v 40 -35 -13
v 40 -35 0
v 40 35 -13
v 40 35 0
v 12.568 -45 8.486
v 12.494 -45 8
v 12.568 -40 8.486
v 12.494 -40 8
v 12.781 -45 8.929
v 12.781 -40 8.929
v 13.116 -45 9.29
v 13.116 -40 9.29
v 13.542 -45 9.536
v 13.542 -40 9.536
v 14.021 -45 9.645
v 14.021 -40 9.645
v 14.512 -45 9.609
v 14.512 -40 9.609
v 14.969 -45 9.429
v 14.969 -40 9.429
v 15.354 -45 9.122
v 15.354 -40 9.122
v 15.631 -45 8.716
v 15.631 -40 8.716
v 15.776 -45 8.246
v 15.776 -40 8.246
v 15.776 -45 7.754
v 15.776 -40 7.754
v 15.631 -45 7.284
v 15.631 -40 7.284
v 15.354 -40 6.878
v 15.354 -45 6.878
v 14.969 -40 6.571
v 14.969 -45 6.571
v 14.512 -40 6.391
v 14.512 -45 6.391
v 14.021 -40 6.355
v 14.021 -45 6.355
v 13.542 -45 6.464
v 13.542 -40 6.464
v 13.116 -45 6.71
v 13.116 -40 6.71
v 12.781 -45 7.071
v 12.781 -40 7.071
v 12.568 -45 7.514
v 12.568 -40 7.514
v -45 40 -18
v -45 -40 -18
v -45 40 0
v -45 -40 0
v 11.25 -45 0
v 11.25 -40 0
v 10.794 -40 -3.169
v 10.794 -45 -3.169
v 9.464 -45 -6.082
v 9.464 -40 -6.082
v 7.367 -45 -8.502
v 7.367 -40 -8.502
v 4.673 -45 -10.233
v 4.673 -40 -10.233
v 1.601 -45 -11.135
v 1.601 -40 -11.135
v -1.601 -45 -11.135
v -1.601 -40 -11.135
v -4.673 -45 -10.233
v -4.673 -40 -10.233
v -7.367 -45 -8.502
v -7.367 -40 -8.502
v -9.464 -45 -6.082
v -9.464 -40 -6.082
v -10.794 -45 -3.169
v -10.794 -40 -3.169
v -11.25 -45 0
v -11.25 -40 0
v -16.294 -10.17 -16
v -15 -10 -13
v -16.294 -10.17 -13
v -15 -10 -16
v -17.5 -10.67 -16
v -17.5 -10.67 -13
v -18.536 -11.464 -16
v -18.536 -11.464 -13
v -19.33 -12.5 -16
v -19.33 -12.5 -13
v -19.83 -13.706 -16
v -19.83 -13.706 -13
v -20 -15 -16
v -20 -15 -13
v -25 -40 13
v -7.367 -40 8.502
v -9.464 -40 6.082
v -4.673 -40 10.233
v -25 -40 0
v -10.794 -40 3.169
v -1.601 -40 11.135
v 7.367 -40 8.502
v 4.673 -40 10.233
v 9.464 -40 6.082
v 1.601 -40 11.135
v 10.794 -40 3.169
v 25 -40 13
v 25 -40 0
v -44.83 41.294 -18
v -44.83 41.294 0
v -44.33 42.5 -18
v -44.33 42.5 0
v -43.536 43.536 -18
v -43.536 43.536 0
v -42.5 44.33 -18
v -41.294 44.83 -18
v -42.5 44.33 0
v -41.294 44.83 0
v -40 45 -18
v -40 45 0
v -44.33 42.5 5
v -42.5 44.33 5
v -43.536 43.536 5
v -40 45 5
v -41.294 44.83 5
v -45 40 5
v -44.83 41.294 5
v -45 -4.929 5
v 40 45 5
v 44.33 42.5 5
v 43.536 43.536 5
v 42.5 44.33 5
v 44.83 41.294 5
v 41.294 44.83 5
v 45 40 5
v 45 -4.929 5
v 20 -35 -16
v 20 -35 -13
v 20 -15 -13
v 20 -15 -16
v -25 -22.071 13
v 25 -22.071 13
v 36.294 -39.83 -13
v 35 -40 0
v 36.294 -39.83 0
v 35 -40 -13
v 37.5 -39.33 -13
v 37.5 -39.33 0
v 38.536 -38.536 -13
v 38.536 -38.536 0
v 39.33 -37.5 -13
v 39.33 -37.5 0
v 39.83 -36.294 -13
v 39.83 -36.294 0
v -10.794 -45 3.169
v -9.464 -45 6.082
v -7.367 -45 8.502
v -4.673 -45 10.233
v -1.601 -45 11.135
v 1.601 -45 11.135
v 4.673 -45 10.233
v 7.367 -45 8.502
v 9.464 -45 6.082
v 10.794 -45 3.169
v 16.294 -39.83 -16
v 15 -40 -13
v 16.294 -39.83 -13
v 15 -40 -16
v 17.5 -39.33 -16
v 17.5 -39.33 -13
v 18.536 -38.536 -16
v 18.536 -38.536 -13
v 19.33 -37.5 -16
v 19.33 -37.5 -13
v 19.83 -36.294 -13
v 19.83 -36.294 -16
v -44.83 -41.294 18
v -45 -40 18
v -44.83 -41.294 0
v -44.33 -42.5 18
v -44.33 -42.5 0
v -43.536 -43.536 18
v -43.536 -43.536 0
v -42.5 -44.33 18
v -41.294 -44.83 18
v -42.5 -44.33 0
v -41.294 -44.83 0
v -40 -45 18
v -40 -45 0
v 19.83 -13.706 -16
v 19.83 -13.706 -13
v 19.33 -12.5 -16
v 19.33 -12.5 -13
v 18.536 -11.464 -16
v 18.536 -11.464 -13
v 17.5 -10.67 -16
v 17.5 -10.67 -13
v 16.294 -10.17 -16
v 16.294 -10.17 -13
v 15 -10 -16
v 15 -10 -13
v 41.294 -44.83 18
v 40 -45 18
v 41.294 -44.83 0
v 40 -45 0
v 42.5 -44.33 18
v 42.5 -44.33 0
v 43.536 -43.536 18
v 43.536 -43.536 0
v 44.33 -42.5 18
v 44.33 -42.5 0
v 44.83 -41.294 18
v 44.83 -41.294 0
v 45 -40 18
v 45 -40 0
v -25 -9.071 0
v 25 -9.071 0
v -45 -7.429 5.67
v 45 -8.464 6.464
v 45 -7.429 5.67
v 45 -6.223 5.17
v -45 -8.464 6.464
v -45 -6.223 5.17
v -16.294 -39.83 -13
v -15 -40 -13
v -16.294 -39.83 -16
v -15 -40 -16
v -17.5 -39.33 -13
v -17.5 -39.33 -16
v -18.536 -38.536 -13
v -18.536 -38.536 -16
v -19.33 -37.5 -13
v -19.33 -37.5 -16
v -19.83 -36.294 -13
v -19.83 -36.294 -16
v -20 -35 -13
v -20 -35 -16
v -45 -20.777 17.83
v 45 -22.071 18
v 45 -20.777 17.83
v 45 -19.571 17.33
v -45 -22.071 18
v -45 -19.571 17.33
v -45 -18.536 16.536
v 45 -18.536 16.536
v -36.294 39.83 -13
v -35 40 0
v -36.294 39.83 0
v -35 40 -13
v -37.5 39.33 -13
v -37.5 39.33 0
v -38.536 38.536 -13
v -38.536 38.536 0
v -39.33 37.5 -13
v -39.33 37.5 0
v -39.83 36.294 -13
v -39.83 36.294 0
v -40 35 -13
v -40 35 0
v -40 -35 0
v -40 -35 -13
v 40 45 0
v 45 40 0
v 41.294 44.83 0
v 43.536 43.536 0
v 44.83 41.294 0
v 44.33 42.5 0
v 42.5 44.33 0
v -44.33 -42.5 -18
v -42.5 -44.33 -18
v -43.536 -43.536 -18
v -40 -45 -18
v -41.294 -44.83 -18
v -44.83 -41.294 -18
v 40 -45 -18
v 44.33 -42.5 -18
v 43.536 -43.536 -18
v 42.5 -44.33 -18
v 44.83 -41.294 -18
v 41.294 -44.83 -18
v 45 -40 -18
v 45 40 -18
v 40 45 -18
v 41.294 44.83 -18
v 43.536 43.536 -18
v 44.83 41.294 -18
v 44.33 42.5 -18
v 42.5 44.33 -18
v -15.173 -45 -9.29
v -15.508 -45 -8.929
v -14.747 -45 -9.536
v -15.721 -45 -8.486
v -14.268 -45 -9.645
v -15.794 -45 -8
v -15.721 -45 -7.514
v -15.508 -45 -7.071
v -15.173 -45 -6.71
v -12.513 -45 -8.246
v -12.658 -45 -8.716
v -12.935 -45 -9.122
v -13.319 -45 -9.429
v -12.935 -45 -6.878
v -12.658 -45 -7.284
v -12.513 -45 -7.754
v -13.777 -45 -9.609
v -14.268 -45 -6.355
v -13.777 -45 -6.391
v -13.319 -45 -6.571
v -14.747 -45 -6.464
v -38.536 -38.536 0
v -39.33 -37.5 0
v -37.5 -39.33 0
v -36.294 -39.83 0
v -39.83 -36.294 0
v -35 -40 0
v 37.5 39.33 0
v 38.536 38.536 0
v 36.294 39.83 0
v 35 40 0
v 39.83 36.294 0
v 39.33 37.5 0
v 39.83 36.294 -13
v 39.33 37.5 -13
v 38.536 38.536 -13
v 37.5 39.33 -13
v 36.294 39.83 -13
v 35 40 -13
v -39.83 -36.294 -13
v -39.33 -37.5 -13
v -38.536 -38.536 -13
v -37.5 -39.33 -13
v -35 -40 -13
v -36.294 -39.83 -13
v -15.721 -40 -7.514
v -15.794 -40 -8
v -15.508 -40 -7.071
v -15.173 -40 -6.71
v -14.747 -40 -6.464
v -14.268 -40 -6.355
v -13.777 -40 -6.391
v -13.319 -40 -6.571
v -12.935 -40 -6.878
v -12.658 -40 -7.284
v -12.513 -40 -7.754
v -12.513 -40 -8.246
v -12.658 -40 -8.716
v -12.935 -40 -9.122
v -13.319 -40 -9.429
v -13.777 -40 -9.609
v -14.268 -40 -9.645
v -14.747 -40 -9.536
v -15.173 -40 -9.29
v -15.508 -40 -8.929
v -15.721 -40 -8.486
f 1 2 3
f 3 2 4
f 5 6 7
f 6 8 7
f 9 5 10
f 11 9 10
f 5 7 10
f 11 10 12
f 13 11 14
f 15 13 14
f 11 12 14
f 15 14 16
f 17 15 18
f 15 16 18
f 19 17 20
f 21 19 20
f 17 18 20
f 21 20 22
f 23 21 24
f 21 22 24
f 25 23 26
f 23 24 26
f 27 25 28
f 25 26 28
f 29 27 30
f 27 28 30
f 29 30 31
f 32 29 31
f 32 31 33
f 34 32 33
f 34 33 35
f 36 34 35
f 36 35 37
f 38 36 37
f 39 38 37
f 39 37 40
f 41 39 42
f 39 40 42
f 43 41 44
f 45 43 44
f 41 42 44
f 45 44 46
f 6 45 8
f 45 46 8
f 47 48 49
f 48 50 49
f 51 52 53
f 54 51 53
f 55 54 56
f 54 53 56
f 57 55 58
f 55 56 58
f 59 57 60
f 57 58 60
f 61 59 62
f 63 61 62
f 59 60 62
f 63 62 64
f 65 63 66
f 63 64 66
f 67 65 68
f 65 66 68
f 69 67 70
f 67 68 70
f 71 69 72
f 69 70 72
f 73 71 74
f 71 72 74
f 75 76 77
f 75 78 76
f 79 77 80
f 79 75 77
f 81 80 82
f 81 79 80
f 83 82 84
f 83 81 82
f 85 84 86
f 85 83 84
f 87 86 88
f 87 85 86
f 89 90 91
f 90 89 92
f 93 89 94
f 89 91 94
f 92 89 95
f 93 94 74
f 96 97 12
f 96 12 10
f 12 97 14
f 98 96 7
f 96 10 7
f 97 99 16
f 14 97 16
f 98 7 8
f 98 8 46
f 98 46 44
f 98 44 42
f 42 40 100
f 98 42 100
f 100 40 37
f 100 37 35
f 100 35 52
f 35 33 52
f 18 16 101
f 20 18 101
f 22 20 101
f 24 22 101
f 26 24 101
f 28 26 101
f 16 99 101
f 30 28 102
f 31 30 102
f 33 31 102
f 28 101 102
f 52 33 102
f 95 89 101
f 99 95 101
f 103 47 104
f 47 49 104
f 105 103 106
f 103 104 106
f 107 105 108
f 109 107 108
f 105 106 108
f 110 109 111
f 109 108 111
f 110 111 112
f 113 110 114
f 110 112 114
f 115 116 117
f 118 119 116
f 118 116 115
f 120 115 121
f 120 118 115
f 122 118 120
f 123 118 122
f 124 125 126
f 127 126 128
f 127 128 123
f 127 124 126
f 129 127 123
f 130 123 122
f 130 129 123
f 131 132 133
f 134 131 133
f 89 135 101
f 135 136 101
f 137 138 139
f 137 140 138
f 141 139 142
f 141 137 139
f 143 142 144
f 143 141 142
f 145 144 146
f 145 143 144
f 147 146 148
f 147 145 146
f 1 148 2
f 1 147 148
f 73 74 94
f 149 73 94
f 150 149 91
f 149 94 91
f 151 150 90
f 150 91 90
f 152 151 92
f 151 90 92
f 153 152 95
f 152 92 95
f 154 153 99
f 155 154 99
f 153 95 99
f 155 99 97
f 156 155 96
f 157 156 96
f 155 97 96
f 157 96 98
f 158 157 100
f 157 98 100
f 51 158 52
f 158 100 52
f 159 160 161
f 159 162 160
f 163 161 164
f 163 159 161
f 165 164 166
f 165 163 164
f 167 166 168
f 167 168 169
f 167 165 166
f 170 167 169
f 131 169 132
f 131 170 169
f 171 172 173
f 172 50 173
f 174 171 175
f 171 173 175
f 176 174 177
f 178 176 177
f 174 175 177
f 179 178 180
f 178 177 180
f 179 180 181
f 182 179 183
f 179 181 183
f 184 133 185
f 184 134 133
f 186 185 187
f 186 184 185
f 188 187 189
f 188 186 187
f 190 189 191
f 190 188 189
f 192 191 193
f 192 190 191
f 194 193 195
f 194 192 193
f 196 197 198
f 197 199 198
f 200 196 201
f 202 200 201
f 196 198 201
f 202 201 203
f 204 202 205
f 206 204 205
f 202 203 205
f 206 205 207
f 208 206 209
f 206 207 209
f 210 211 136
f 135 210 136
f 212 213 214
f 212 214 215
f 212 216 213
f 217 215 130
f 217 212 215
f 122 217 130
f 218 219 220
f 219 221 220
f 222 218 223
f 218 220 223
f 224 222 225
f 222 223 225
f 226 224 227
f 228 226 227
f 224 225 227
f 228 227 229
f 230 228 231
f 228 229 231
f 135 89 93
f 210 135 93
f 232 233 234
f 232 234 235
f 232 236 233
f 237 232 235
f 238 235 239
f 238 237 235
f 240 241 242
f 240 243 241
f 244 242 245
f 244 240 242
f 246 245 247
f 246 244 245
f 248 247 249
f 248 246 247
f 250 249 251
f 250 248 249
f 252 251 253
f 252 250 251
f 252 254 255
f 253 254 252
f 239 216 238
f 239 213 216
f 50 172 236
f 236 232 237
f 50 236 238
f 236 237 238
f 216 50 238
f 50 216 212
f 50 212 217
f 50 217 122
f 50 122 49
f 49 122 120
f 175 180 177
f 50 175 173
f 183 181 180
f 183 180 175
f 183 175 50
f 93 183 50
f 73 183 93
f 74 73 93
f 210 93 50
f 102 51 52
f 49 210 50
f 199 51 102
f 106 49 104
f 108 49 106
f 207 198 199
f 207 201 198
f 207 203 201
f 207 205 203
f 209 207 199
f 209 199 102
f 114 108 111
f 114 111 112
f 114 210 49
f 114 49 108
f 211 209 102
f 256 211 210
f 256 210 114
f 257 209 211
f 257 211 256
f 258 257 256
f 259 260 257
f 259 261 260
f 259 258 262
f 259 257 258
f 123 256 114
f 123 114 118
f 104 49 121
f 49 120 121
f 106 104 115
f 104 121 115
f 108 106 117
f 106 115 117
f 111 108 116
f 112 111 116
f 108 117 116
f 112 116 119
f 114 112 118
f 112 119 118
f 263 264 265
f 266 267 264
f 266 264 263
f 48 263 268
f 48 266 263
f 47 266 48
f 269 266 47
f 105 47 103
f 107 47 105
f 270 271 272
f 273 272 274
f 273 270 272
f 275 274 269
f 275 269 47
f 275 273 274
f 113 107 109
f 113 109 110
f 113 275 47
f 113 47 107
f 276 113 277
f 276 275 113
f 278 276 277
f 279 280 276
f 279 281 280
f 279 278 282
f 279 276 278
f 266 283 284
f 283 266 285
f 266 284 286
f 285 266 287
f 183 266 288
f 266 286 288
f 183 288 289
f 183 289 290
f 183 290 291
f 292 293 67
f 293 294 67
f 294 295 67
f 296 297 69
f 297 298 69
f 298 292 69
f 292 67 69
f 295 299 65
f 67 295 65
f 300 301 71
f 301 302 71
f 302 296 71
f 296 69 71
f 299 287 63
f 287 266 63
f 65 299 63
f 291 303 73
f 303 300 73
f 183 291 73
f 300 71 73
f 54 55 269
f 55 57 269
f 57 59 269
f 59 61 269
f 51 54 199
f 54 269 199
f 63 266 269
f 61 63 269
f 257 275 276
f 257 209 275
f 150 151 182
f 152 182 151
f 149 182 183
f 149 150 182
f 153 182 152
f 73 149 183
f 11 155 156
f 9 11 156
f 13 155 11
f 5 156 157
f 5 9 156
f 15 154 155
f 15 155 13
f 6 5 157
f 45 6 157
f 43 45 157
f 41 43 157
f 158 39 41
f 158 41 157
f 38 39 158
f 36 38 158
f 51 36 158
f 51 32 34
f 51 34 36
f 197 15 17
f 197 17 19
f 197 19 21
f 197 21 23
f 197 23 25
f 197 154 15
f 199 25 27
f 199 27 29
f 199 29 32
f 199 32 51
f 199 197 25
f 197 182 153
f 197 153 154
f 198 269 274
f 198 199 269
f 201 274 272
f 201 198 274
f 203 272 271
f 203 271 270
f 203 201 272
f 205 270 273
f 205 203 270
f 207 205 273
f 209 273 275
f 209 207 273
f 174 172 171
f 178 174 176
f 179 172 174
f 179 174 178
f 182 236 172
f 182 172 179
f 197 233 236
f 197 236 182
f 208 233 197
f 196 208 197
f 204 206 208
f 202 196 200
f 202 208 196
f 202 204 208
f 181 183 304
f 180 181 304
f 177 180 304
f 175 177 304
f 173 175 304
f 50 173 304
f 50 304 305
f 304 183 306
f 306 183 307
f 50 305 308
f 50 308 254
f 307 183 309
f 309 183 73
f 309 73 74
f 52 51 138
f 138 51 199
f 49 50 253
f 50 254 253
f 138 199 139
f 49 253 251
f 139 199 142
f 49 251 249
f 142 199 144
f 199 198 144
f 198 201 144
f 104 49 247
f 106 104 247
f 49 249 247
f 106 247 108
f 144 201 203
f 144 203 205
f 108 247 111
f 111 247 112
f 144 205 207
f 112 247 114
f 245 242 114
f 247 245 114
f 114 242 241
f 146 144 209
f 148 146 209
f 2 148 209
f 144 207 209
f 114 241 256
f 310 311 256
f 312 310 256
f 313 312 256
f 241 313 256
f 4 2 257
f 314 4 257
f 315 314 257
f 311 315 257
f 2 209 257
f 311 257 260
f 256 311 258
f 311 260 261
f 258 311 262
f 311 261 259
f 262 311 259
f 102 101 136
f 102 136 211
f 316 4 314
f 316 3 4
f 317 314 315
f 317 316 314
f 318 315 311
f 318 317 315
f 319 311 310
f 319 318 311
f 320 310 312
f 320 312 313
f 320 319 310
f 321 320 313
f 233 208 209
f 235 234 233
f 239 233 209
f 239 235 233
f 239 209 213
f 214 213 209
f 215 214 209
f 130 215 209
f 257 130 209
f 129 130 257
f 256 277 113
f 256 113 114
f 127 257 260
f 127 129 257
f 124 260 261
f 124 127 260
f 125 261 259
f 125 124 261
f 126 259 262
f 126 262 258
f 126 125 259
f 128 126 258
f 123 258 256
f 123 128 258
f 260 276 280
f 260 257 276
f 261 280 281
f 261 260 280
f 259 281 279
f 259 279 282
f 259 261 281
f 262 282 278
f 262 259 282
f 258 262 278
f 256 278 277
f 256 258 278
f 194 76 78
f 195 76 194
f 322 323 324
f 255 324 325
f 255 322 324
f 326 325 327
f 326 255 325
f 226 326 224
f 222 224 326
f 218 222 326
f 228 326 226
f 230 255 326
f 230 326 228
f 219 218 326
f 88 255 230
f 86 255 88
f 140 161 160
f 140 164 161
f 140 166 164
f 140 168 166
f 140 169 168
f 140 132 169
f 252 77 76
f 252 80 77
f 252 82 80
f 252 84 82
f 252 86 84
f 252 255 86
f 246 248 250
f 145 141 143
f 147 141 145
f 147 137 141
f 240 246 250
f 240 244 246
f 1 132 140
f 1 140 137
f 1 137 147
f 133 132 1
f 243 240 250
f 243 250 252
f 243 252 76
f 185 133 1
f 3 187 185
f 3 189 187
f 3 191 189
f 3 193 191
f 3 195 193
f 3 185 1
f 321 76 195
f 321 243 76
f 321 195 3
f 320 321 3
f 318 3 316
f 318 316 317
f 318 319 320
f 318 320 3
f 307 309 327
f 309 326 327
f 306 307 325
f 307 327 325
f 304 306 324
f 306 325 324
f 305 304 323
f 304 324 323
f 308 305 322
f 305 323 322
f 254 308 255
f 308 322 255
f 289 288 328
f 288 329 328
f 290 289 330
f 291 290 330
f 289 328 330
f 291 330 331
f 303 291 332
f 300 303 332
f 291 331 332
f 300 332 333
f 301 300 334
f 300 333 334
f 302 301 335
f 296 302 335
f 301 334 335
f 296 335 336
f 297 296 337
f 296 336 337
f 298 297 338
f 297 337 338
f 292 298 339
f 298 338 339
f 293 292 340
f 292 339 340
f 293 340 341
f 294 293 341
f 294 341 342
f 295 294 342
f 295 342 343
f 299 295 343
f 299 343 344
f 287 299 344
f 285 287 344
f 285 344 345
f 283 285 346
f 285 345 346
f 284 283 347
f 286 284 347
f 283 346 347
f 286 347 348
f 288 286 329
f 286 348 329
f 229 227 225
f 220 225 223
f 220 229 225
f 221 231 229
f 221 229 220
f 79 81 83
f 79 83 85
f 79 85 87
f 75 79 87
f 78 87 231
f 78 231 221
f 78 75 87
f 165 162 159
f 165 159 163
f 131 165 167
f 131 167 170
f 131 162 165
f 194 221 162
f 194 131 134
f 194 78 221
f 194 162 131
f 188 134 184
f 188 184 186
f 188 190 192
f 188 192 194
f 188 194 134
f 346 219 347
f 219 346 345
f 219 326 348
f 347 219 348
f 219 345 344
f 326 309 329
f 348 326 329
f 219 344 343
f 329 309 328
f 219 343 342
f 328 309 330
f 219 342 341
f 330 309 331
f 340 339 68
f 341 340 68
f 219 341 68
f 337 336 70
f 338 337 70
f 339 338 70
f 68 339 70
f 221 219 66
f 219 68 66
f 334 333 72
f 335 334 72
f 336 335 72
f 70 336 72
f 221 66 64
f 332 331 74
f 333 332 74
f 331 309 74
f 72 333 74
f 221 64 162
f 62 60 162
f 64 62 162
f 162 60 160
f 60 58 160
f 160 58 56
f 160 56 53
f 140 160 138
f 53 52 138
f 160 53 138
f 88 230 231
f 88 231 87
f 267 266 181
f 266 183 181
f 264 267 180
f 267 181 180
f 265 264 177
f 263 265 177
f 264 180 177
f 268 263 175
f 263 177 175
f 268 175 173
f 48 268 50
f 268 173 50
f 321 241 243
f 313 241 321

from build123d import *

# Parameters (mm, degrees)
F0_W        = 90
F0_H        = 18
F1_DEPTH    = 45
F3_DEPTH    = 45
F4_W        = 80
F4_H        = 80
F5_DEPTH    = 13
F6_W        = 40
F6_H        = 30
F7_DEPTH    = 3
F9_D        = 22.5
F9_DEPTH    = 5
F9_TIP      = 6.7596819641
F9_2_D      = 22.5
F9_2_DEPTH  = 5
F9_2_TIP    = 6.7596819641
F11_DEPTH   = 25
F12_R       = 5
F13_R       = 5
F13_2_R     = 5
F14_D       = 3.3
F14_DEPTH   = 5
F14_TIP     = 0.9914200214
F14_2_D     = 3.3
F14_2_DEPTH = 5
F14_2_TIP   = 0.9914200214
F15_R       = 5


with BuildPart() as f1:
    # F0 (on Right) → F1 (new body, symmetric)
    with BuildSketch(Plane.YZ):
        with Locations((0, -9)):
            Rectangle(F0_W, F0_H)
    extrude(amount=F1_DEPTH, both=True)

    # F4 (on face) → F5 (cut)
    with BuildSketch(Plane.XY):
        Rectangle(F4_W, F4_H)
    extrude(amount=-F5_DEPTH, mode=Mode.SUBTRACT)

    # F6 (on face) → F7 (cut)
    with BuildSketch(Plane.XY.offset(-13)):
        with Locations((0, -25)):
            Rectangle(F6_W, F6_H)
    extrude(amount=-F7_DEPTH, mode=Mode.SUBTRACT)

    # F9
    with Locations(Plane.XZ.offset(45)):
        with Locations((0, 0)):
            Hole(F9_D / 2, depth=F9_DEPTH)
            with Locations((0, 0, -(F9_DEPTH + F9_TIP / 2))):  # 118° drill point
                Cone(0, F9_D / 2, F9_TIP, mode=Mode.SUBTRACT)

    # F13#2
    f13_2_edges = [f1.edges().sort_by_distance(p)[0] for p in [
        (45, -45, -9),
        (45, 45, -9),
        (-45, 45, -9),
        (-45, -45, -9),
    ]]
    fillet(f13_2_edges, radius=F13_2_R)

    # F14
    with Locations(Plane.XZ.offset(45)):
        with Locations((-14.1443451598, -8), (14.1443451598, 8)):
            Hole(F14_D / 2, depth=F14_DEPTH)
            with Locations((0, 0, -(F14_DEPTH + F14_TIP / 2))):  # 118° drill point
                Cone(0, F14_D / 2, F14_TIP, mode=Mode.SUBTRACT)

    # F15
    f15_edges = [f1.edges().sort_by_distance(p)[0] for p in [
        (-40, 40, -6.5),
        (40, 40, -6.5),
        (-40, -40, -6.5),
        (40, -40, -6.5),
        (-20, -10, -14.5),
        (20, -10, -14.5),
        (20, -40, -14.5),
        (-20, -40, -14.5),
    ]]
    fillet(f15_edges, radius=F15_R)


with BuildPart() as f3:
    # F2 (on Right) → F3 (new body, symmetric)
    with BuildSketch(Plane.YZ):
        Polygon((-45, 18), (-45, 0), (45, 0), (45, 5), (-7, 5), (-20, 18), align=None)
    extrude(amount=F3_DEPTH, both=True)

    # F9#2
    with Locations(Plane.XZ.offset(45)):
        with Locations((0, 0)):
            Hole(F9_2_D / 2, depth=F9_2_DEPTH)
            with Locations((0, 0, -(F9_2_DEPTH + F9_2_TIP / 2))):  # 118° drill point
                Cone(0, F9_2_D / 2, F9_2_TIP, mode=Mode.SUBTRACT)

    # F10 (on Right) → F11 (cut, symmetric)
    with BuildSketch(Plane.YZ):
        Polygon((-40, 13), (-40, 0), (-9.0710678119, 0), (-22.0710678119, 13), align=None)
    extrude(amount=F11_DEPTH, both=True, mode=Mode.SUBTRACT)

    # F12
    f12_edges = [f3.edges().sort_by_distance(p)[0] for p in [
        (0, -20, 18),
        (0, -7, 5),
    ]]
    fillet(f12_edges, radius=F12_R)

    # F13
    f13_edges = [f3.edges().sort_by_distance(p)[0] for p in [
        (45, -45, 9),
        (45, 45, 2.5),
        (-45, 45, 2.5),
        (-45, -45, 9),
    ]]
    fillet(f13_edges, radius=F13_R)

    # F14#2
    with Locations(Plane.XZ.offset(45)):
        with Locations((-14.1443451598, -8), (14.1443451598, 8)):
            Hole(F14_2_D / 2, depth=F14_2_DEPTH)
            with Locations((0, 0, -(F14_2_DEPTH + F14_2_TIP / 2))):  # 118° drill point
                Cone(0, F14_2_D / 2, F14_2_TIP, mode=Mode.SUBTRACT)


solid = Compound([f1.part, f3.part])
